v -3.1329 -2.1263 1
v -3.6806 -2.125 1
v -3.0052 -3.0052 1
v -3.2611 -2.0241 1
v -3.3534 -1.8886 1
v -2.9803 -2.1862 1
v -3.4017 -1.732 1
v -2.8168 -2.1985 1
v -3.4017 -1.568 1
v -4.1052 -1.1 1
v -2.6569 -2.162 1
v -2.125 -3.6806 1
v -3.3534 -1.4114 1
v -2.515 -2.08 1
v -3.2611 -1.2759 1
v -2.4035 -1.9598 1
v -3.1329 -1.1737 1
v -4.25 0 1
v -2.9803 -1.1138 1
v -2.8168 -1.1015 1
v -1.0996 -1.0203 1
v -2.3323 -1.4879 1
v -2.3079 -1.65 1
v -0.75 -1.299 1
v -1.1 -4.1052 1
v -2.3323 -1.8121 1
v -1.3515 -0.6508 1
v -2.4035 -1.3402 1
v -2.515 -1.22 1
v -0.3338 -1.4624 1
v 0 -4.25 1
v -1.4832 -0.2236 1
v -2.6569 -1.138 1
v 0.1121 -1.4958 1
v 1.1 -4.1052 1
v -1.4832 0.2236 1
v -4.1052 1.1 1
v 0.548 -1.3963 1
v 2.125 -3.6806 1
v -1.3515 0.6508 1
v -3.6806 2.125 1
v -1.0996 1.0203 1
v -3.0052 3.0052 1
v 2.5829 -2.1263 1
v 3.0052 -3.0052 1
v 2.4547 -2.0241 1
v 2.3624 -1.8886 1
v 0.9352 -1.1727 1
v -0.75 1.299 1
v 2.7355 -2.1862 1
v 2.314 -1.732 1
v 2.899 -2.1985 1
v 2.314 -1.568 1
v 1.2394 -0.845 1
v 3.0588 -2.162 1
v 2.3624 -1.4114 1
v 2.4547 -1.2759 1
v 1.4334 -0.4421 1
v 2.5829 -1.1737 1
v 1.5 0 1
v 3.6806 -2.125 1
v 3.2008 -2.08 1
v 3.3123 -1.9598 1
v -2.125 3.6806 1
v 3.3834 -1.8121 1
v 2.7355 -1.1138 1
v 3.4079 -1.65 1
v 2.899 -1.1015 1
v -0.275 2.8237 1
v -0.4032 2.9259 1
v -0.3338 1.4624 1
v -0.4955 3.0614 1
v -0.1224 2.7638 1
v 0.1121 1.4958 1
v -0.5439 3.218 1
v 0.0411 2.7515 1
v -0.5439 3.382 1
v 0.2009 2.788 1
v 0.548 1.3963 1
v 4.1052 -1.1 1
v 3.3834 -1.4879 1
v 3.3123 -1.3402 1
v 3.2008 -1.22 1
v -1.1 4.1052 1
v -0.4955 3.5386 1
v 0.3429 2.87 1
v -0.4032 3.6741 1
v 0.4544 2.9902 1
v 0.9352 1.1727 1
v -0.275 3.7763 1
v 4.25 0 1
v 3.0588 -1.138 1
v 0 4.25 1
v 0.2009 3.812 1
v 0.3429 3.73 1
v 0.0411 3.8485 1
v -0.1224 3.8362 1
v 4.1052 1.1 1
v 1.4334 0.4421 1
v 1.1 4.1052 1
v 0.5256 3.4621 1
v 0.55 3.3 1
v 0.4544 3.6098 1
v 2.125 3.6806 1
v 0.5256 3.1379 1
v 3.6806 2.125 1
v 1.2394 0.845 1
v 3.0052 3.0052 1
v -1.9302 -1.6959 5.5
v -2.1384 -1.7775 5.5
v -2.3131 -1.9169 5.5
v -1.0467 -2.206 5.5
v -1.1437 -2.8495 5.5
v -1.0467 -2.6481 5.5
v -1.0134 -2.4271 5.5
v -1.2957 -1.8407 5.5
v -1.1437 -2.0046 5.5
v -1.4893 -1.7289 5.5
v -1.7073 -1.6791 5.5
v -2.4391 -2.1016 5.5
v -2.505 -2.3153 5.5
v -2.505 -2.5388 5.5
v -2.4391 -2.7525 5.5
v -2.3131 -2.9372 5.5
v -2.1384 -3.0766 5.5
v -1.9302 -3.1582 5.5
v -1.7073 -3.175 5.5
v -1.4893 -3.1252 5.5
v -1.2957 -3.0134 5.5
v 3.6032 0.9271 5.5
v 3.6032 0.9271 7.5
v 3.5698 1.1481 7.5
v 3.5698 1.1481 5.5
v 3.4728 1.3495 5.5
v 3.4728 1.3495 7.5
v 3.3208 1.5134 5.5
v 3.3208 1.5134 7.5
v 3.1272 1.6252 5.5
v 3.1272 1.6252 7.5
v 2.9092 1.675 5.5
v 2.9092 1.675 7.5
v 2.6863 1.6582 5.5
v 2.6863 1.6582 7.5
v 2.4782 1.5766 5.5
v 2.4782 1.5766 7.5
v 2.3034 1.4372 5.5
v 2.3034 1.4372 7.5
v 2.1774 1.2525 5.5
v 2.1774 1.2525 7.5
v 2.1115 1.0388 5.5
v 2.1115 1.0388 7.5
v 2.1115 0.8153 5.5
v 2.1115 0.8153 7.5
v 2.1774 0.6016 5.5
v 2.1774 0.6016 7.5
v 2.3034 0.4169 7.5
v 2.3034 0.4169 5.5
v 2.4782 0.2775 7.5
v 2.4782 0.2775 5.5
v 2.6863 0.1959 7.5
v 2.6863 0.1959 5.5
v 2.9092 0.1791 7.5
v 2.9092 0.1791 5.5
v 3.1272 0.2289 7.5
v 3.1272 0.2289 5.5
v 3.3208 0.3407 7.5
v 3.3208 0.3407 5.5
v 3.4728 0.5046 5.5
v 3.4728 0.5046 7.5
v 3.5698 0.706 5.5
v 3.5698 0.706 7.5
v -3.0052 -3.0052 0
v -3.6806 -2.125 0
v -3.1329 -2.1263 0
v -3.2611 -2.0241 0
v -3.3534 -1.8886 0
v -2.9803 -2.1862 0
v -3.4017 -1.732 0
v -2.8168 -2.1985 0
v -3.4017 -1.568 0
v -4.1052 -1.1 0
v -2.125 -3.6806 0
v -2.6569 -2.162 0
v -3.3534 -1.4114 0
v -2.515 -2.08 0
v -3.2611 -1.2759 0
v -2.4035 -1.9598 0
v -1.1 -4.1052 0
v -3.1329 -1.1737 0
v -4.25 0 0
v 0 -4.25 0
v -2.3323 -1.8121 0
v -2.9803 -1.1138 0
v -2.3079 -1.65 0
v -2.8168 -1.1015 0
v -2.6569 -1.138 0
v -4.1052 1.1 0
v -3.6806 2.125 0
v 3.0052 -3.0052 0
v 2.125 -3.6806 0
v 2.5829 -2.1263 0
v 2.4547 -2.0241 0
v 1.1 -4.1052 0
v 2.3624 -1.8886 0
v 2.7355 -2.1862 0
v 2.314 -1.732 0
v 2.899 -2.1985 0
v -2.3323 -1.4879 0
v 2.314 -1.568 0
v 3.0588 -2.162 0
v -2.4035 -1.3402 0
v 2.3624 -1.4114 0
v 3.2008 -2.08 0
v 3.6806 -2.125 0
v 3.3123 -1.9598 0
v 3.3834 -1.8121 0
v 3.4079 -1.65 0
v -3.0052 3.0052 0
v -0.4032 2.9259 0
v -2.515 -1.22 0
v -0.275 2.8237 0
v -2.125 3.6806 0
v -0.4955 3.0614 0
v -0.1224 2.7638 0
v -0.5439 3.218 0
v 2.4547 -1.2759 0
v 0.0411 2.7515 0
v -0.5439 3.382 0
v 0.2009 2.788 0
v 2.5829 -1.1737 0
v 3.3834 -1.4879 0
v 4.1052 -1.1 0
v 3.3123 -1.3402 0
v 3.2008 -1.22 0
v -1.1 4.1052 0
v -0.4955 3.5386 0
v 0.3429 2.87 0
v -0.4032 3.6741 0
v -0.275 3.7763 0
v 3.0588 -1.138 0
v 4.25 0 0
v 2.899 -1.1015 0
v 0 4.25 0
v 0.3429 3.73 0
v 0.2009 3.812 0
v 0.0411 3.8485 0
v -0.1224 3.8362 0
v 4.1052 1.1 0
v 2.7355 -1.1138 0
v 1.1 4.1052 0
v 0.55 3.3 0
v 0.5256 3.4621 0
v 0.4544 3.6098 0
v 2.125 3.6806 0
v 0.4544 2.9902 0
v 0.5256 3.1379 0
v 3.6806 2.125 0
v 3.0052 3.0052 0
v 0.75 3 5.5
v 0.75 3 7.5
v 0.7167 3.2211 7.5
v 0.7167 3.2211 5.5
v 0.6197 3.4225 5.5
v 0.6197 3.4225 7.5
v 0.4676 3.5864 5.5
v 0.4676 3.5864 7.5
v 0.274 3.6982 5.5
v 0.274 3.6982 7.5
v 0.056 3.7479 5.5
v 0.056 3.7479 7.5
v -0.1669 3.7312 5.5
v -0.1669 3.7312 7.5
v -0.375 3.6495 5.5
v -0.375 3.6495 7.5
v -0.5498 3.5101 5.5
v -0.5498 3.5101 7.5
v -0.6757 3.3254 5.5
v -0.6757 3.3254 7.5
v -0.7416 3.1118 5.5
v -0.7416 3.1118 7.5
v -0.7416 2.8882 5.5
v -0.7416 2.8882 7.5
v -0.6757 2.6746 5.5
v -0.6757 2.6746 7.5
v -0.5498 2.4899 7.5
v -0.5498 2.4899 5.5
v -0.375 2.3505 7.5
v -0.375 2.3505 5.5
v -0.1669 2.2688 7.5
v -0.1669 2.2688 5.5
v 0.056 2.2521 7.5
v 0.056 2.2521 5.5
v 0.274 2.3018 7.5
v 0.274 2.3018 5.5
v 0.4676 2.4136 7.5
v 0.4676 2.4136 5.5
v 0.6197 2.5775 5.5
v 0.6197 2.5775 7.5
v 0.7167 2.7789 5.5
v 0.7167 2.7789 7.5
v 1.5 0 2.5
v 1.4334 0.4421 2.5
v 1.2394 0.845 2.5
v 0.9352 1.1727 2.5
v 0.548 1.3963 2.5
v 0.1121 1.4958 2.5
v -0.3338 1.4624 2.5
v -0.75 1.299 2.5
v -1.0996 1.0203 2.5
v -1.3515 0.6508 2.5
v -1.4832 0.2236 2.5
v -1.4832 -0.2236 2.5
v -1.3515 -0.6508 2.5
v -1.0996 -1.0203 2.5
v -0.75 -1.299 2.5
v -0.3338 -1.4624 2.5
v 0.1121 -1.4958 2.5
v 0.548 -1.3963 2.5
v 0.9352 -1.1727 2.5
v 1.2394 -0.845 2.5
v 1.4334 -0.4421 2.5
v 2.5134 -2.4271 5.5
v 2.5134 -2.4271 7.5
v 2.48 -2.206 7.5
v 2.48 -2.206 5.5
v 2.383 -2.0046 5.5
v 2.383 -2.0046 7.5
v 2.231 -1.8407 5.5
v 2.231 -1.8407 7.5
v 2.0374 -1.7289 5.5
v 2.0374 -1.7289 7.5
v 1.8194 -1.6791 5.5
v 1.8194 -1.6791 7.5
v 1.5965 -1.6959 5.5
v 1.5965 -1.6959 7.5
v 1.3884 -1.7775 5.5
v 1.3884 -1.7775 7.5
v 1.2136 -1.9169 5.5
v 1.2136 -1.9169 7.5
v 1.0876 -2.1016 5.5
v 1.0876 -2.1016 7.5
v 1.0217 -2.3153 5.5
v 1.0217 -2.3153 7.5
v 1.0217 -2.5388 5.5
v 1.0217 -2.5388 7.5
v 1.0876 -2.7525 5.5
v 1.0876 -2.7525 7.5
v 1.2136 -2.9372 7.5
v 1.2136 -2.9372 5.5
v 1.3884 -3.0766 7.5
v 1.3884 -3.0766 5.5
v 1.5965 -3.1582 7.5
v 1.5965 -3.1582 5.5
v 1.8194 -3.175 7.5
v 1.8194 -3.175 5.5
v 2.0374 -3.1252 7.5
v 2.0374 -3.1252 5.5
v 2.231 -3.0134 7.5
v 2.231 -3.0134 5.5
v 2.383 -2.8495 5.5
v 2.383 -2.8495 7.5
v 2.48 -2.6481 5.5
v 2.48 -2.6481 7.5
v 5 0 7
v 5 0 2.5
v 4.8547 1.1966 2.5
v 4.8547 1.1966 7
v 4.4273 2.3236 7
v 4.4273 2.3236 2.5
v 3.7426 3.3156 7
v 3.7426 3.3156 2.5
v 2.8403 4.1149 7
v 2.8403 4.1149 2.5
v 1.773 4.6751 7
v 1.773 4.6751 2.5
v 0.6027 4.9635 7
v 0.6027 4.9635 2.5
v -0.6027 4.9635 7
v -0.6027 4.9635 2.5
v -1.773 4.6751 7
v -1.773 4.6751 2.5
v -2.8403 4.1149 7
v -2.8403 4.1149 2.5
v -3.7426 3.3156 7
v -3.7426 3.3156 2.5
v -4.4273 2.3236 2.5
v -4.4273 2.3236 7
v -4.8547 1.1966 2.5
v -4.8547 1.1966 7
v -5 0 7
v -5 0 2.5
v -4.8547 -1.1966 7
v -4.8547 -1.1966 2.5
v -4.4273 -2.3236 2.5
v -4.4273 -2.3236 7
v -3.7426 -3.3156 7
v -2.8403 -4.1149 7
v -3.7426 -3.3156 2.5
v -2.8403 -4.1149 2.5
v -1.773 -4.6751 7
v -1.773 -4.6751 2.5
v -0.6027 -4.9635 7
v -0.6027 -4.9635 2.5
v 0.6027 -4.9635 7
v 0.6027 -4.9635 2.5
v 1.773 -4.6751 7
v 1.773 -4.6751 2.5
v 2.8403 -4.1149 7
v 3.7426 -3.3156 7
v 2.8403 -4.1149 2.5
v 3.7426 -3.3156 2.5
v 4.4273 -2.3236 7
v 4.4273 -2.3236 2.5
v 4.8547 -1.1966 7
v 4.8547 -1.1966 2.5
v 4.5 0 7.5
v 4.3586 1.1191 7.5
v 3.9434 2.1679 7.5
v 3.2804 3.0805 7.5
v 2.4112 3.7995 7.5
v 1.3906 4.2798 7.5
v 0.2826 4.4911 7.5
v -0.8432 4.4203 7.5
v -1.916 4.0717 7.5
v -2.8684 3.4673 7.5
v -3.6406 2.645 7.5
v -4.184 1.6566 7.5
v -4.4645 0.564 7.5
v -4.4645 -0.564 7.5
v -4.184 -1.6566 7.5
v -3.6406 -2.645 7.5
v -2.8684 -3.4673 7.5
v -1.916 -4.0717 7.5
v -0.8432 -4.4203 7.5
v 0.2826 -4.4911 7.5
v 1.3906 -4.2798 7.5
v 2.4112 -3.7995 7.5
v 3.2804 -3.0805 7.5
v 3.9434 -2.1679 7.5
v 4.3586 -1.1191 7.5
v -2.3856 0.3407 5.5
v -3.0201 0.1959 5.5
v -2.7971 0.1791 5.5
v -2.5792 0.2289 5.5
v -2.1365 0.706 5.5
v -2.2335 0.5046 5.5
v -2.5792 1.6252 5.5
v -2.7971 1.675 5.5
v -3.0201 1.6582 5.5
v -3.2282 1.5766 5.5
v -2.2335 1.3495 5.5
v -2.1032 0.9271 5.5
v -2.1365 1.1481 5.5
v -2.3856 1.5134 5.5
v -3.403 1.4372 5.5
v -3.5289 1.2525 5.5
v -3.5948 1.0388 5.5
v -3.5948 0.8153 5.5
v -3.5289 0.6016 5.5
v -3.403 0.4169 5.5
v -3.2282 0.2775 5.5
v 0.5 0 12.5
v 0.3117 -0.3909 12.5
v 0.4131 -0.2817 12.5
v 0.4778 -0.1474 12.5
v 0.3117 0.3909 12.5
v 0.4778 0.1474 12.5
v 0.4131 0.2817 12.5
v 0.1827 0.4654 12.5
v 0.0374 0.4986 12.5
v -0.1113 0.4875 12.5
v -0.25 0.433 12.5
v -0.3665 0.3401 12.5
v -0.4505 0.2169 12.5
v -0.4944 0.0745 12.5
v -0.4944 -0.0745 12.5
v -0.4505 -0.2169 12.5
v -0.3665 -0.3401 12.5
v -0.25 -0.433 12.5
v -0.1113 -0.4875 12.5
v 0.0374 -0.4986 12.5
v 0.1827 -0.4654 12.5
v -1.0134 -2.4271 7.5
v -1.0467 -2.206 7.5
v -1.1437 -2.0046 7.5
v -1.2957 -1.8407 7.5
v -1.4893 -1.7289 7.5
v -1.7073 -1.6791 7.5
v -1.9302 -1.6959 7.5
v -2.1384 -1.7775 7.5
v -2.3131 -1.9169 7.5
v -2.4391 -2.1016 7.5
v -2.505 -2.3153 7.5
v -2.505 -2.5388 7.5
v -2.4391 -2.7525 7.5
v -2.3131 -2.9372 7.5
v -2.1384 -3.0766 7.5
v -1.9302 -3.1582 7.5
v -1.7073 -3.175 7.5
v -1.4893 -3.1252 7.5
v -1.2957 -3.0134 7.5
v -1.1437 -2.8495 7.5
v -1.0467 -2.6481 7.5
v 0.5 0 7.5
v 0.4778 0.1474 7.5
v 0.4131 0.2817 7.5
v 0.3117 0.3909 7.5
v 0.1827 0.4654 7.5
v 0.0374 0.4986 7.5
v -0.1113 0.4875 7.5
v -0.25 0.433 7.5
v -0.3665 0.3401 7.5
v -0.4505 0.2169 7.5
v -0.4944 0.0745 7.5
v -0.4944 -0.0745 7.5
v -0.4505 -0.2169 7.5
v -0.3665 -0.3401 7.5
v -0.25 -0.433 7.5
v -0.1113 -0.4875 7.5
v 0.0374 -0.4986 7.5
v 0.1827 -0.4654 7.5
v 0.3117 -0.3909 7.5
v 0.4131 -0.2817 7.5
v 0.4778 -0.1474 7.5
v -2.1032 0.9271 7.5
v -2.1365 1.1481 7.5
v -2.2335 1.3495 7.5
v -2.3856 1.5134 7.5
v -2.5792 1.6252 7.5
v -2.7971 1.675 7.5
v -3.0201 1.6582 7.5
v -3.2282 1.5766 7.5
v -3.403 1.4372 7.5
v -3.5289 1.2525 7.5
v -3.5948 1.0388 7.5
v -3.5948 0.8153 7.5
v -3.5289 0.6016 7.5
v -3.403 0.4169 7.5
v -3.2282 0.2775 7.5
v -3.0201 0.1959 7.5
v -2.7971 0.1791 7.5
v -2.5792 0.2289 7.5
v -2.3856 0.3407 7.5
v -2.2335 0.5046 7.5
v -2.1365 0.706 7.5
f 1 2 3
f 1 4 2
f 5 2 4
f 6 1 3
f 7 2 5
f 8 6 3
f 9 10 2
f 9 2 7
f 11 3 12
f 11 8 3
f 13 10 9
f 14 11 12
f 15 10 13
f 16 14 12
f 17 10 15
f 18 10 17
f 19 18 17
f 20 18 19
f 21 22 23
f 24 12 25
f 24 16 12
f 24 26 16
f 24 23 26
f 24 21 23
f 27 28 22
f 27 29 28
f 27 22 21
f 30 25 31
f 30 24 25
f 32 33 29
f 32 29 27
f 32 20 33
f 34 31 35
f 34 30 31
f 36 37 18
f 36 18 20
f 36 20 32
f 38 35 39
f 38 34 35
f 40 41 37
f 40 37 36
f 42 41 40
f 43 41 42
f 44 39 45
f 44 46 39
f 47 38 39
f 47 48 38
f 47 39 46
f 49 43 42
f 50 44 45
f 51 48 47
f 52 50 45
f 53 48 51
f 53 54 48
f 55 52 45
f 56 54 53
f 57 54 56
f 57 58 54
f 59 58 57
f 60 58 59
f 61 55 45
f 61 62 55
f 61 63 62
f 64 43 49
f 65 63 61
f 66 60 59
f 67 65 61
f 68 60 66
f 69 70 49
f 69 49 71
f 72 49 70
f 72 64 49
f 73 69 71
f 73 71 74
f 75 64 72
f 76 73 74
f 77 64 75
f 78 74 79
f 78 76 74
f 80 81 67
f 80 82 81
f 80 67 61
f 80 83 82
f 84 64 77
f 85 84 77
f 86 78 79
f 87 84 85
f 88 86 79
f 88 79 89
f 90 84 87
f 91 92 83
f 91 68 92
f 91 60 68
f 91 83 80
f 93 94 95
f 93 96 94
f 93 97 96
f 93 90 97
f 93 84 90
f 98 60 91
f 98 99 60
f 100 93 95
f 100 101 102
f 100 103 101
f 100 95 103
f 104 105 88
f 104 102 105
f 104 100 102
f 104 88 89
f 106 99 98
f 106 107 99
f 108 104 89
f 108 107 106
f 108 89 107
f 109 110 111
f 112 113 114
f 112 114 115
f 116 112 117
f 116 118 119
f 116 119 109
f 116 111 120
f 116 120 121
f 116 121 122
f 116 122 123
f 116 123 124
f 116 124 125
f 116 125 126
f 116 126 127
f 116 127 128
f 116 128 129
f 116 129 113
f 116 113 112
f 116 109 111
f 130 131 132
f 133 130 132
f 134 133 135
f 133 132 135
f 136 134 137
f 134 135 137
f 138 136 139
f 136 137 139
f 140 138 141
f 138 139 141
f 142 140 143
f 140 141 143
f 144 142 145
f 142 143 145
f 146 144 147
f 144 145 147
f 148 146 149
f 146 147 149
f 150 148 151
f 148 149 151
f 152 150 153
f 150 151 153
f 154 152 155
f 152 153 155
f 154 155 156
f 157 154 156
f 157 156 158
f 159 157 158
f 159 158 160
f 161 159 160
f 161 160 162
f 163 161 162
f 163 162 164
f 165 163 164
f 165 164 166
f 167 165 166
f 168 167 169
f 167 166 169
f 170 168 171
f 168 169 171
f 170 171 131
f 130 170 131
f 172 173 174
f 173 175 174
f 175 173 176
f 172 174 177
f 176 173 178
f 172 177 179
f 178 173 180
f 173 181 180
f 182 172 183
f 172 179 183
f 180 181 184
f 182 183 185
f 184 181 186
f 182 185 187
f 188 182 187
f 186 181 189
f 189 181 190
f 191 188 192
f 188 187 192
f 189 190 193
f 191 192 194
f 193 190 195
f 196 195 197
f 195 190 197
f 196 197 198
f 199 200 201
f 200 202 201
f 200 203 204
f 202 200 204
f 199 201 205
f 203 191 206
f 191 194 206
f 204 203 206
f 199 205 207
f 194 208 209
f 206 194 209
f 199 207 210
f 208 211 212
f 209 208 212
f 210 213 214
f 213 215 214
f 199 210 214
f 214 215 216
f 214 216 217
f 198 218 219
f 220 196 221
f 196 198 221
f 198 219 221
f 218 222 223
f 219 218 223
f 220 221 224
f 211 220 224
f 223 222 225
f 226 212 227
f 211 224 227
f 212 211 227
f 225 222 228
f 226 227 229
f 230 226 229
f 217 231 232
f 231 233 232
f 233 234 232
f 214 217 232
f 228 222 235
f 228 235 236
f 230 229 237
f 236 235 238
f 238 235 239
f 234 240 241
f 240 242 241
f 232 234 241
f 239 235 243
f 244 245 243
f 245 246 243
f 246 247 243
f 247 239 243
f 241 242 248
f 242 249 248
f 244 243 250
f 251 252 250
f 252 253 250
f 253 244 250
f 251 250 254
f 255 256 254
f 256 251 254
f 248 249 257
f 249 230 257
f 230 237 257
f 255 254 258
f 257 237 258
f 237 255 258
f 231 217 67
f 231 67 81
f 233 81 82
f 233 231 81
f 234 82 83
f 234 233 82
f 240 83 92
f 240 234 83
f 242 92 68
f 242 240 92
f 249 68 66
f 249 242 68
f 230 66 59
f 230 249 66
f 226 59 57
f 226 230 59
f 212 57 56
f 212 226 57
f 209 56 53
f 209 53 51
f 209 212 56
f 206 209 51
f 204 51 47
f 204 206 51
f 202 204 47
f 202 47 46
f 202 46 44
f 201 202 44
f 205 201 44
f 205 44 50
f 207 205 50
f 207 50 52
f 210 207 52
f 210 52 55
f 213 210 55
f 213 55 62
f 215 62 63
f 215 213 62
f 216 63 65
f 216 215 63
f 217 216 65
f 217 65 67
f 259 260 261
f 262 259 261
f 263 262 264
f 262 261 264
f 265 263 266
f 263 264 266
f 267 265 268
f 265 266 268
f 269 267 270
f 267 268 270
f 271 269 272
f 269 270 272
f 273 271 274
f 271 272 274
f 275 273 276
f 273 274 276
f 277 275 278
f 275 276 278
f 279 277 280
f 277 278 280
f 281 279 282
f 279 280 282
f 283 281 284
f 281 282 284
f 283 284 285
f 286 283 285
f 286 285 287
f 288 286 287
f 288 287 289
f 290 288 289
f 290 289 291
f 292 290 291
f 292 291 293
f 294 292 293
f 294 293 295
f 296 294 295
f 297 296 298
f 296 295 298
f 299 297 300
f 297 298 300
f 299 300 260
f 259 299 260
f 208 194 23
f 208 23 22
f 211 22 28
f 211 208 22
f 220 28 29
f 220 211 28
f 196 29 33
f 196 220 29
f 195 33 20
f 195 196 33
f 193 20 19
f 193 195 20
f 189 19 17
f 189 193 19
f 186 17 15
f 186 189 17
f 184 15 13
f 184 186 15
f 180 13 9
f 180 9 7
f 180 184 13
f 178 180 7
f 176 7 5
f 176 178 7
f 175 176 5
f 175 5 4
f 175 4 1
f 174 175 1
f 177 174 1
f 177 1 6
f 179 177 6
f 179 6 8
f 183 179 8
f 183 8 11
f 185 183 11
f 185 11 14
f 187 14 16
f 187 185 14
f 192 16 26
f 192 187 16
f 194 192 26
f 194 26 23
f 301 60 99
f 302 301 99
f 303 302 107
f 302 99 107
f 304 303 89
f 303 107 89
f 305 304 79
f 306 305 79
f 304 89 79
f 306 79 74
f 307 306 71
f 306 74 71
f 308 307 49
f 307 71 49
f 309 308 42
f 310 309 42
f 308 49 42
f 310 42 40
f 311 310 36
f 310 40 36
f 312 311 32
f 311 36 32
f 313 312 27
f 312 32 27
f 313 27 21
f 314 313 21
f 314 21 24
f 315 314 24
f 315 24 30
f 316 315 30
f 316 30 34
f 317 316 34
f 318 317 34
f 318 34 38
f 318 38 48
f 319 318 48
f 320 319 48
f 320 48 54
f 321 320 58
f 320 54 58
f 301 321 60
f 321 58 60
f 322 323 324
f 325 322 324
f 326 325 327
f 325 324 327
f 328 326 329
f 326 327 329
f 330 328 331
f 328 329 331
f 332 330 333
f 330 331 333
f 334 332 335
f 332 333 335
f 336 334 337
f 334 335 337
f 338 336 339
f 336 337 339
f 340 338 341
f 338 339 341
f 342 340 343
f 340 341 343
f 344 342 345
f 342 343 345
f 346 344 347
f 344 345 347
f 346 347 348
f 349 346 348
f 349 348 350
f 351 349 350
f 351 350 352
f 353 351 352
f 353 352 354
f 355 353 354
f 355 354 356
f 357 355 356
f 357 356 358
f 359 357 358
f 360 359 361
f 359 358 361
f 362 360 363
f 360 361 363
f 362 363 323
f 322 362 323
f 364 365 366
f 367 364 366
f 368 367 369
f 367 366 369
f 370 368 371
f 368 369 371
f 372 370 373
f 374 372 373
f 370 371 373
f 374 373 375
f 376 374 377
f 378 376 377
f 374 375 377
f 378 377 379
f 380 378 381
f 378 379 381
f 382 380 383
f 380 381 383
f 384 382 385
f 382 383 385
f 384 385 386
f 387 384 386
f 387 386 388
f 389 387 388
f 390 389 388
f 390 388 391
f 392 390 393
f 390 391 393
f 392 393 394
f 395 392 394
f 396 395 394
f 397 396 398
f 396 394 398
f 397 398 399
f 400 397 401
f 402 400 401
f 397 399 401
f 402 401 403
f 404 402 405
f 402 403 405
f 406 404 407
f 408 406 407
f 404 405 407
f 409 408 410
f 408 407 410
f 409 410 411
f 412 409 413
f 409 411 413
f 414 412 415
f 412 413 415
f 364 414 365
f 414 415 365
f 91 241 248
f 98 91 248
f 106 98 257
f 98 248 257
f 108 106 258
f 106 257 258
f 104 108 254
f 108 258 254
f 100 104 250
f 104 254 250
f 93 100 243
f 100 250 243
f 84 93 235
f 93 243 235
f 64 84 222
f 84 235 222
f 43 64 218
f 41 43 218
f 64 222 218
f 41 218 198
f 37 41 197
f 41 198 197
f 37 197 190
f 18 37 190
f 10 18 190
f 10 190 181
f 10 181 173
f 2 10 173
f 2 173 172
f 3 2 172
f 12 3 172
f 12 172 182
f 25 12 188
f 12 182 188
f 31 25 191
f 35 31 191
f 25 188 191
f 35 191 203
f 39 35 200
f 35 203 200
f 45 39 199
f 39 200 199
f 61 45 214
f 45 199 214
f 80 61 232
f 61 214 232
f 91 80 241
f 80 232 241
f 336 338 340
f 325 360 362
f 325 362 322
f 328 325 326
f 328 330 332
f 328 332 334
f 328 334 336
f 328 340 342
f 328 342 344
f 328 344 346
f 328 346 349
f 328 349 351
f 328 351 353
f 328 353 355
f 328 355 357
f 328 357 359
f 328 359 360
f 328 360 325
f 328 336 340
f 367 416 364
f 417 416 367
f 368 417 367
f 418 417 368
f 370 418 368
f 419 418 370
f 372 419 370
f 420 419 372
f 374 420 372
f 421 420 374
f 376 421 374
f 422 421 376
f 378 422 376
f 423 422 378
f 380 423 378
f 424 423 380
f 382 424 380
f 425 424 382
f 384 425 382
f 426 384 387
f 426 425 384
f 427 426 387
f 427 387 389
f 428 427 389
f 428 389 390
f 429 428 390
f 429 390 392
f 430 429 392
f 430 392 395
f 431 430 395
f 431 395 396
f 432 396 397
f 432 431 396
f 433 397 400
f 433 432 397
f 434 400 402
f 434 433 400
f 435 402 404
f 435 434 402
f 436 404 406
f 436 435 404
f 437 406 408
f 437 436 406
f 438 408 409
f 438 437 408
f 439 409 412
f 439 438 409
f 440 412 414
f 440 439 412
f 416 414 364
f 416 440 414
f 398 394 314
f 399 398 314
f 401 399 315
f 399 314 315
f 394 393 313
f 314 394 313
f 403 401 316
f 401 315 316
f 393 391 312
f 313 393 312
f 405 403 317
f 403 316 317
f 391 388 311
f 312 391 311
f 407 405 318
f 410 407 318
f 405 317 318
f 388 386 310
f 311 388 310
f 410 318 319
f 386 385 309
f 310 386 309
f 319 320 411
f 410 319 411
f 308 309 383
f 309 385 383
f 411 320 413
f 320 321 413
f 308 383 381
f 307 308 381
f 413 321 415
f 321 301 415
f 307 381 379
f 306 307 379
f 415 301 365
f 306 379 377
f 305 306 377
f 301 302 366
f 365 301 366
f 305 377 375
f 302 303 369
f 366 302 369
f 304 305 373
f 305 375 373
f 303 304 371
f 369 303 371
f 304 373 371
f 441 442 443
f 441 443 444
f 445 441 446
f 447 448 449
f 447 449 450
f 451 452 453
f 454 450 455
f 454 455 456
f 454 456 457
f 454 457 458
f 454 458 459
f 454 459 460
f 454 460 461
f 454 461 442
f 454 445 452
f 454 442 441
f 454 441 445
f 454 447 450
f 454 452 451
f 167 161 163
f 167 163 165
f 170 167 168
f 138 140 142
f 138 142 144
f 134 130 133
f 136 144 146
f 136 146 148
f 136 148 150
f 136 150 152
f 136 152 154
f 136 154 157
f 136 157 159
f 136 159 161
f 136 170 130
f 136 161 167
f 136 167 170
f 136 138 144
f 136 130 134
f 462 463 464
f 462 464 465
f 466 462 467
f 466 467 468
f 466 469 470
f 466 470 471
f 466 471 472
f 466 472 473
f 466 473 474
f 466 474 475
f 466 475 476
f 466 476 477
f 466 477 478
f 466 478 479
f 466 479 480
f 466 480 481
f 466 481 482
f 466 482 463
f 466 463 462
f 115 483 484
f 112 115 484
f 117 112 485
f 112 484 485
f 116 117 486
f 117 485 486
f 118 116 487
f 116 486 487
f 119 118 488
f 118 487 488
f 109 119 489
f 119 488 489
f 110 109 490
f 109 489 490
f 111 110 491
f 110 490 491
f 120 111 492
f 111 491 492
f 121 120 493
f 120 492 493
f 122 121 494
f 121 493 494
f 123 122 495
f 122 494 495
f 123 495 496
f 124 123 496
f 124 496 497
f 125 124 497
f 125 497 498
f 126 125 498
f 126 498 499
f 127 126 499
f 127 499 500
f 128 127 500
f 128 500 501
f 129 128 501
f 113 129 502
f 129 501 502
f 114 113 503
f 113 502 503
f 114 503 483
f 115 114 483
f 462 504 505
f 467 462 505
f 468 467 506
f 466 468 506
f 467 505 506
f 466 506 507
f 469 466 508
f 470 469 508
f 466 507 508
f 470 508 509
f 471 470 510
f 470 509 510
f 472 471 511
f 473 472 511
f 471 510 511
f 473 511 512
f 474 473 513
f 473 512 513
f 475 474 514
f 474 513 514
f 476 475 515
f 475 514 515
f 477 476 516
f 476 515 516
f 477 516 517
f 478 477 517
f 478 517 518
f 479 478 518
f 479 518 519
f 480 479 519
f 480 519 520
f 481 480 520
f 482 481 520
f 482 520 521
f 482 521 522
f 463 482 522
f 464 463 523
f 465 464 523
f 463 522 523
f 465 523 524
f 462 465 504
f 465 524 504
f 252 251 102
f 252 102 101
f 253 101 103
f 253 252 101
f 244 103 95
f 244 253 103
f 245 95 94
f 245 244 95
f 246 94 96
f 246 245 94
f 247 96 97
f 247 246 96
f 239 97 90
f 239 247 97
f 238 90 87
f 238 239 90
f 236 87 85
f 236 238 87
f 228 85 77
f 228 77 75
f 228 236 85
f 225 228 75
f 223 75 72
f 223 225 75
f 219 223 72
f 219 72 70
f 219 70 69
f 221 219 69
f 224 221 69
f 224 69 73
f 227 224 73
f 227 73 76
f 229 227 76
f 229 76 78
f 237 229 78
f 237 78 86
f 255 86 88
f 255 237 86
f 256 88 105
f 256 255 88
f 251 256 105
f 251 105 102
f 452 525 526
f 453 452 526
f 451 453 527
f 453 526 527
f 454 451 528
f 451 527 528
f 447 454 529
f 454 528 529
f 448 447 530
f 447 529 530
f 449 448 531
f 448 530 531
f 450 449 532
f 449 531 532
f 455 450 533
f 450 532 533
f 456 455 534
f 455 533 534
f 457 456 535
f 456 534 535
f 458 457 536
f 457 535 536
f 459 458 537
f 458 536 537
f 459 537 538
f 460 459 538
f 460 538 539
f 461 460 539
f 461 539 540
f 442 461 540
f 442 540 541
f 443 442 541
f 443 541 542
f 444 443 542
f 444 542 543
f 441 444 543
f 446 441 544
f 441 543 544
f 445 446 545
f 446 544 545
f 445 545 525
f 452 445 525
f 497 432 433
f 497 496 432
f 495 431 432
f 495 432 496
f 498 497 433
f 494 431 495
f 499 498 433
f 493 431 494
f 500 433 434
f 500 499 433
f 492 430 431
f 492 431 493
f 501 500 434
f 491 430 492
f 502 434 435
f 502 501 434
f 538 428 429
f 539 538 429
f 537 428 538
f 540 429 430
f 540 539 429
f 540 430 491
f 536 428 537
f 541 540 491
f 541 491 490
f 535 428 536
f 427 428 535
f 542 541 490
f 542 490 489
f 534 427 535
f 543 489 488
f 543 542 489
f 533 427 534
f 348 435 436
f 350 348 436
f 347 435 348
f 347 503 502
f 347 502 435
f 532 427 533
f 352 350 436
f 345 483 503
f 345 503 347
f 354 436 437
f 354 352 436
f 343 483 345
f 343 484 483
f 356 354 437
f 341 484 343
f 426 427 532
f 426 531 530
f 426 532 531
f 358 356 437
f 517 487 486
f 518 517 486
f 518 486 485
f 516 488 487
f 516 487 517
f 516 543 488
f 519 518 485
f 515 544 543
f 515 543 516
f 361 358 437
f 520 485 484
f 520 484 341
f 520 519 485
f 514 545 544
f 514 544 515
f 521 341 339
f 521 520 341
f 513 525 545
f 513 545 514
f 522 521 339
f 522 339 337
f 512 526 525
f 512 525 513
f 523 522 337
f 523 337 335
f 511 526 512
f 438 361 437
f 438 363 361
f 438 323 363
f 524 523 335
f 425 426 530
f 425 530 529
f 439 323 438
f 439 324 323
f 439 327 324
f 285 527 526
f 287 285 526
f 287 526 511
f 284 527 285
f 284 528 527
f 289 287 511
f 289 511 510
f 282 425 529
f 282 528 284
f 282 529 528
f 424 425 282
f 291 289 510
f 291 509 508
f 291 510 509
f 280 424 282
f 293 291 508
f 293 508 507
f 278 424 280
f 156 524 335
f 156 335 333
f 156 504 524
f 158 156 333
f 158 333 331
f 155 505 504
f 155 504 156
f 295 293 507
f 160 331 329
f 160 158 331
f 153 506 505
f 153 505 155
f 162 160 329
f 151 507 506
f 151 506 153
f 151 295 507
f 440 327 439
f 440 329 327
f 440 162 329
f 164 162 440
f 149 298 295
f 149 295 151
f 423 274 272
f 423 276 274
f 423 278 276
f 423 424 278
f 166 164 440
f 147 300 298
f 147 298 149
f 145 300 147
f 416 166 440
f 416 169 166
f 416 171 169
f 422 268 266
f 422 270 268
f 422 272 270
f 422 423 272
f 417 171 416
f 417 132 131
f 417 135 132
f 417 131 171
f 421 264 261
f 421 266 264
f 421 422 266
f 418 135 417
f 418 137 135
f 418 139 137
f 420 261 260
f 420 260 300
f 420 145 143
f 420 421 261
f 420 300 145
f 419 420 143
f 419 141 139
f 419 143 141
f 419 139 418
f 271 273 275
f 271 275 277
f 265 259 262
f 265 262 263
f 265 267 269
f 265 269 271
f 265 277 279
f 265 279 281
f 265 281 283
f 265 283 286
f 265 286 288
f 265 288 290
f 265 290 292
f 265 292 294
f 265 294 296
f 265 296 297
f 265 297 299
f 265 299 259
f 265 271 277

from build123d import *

# Parameters (mm, degrees)
SKETCH1_R           = 4.25
SKETCH1_R_2         = 0.55
BOSS_EXTRUDE1_DEPTH = 1
SKETCH2_R           = 1.5
BOSS_EXTRUDE2_DEPTH = 1.5
SKETCH3_R           = 5
BOSS_EXTRUDE3_DEPTH = 5
SKETCH4_R           = 0.5
BOSS_EXTRUDE4_DEPTH = 5
SKETCH5_R           = 0.75
CUT_EXTRUDE1_DEPTH  = 2
CHAMFER1_SIZE       = 0.5


with BuildPart() as part:
    # Sketch1 → Boss-Extrude1 (new body)
    with BuildSketch(Plane.XY):
        Circle(SKETCH1_R)
        with Locations((0, 3.3)):
            Circle(SKETCH1_R_2, mode=Mode.SUBTRACT)
        with Locations((2.857883832, -1.65)):
            Circle(SKETCH1_R_2, mode=Mode.SUBTRACT)
        with Locations((-2.857883832, -1.65)):
            Circle(SKETCH1_R_2, mode=Mode.SUBTRACT)
    extrude(amount=BOSS_EXTRUDE1_DEPTH)

    # Sketch2 → Boss-Extrude2 (add)
    with BuildSketch(Plane.XY.offset(1)):
        Circle(SKETCH2_R)
    extrude(amount=BOSS_EXTRUDE2_DEPTH)

    # Sketch3 → Boss-Extrude3 (add)
    with BuildSketch(Plane.XY.offset(2.5)):
        Circle(SKETCH3_R)
    extrude(amount=BOSS_EXTRUDE3_DEPTH)

    # Sketch4 → Boss-Extrude4 (add)
    with BuildSketch(Plane.XY.offset(7.5)):
        Circle(SKETCH4_R)
    extrude(amount=BOSS_EXTRUDE4_DEPTH)

    # Sketch5 → Cut-Extrude1 (cut)
    with BuildSketch(Plane.XY.offset(7.5)):
        with Locations((0, 3)):
            Circle(SKETCH5_R)
        with Locations((2.853169549, 0.927050983)):
            Circle(SKETCH5_R)
        with Locations((1.763355757, -2.427050983)):
            Circle(SKETCH5_R)
        with Locations((-1.763355757, -2.427050983)):
            Circle(SKETCH5_R)
        with Locations((-2.853169549, 0.927050983)):
            Circle(SKETCH5_R)
    extrude(amount=-CUT_EXTRUDE1_DEPTH, mode=Mode.SUBTRACT)

    # Chamfer1
    chamfer1_edges = [part.edges().sort_by_distance(p)[0] for p in [
        (-5, 0, 7.5),
    ]]
    chamfer(chamfer1_edges, length=CHAMFER1_SIZE)


solid = part.part
